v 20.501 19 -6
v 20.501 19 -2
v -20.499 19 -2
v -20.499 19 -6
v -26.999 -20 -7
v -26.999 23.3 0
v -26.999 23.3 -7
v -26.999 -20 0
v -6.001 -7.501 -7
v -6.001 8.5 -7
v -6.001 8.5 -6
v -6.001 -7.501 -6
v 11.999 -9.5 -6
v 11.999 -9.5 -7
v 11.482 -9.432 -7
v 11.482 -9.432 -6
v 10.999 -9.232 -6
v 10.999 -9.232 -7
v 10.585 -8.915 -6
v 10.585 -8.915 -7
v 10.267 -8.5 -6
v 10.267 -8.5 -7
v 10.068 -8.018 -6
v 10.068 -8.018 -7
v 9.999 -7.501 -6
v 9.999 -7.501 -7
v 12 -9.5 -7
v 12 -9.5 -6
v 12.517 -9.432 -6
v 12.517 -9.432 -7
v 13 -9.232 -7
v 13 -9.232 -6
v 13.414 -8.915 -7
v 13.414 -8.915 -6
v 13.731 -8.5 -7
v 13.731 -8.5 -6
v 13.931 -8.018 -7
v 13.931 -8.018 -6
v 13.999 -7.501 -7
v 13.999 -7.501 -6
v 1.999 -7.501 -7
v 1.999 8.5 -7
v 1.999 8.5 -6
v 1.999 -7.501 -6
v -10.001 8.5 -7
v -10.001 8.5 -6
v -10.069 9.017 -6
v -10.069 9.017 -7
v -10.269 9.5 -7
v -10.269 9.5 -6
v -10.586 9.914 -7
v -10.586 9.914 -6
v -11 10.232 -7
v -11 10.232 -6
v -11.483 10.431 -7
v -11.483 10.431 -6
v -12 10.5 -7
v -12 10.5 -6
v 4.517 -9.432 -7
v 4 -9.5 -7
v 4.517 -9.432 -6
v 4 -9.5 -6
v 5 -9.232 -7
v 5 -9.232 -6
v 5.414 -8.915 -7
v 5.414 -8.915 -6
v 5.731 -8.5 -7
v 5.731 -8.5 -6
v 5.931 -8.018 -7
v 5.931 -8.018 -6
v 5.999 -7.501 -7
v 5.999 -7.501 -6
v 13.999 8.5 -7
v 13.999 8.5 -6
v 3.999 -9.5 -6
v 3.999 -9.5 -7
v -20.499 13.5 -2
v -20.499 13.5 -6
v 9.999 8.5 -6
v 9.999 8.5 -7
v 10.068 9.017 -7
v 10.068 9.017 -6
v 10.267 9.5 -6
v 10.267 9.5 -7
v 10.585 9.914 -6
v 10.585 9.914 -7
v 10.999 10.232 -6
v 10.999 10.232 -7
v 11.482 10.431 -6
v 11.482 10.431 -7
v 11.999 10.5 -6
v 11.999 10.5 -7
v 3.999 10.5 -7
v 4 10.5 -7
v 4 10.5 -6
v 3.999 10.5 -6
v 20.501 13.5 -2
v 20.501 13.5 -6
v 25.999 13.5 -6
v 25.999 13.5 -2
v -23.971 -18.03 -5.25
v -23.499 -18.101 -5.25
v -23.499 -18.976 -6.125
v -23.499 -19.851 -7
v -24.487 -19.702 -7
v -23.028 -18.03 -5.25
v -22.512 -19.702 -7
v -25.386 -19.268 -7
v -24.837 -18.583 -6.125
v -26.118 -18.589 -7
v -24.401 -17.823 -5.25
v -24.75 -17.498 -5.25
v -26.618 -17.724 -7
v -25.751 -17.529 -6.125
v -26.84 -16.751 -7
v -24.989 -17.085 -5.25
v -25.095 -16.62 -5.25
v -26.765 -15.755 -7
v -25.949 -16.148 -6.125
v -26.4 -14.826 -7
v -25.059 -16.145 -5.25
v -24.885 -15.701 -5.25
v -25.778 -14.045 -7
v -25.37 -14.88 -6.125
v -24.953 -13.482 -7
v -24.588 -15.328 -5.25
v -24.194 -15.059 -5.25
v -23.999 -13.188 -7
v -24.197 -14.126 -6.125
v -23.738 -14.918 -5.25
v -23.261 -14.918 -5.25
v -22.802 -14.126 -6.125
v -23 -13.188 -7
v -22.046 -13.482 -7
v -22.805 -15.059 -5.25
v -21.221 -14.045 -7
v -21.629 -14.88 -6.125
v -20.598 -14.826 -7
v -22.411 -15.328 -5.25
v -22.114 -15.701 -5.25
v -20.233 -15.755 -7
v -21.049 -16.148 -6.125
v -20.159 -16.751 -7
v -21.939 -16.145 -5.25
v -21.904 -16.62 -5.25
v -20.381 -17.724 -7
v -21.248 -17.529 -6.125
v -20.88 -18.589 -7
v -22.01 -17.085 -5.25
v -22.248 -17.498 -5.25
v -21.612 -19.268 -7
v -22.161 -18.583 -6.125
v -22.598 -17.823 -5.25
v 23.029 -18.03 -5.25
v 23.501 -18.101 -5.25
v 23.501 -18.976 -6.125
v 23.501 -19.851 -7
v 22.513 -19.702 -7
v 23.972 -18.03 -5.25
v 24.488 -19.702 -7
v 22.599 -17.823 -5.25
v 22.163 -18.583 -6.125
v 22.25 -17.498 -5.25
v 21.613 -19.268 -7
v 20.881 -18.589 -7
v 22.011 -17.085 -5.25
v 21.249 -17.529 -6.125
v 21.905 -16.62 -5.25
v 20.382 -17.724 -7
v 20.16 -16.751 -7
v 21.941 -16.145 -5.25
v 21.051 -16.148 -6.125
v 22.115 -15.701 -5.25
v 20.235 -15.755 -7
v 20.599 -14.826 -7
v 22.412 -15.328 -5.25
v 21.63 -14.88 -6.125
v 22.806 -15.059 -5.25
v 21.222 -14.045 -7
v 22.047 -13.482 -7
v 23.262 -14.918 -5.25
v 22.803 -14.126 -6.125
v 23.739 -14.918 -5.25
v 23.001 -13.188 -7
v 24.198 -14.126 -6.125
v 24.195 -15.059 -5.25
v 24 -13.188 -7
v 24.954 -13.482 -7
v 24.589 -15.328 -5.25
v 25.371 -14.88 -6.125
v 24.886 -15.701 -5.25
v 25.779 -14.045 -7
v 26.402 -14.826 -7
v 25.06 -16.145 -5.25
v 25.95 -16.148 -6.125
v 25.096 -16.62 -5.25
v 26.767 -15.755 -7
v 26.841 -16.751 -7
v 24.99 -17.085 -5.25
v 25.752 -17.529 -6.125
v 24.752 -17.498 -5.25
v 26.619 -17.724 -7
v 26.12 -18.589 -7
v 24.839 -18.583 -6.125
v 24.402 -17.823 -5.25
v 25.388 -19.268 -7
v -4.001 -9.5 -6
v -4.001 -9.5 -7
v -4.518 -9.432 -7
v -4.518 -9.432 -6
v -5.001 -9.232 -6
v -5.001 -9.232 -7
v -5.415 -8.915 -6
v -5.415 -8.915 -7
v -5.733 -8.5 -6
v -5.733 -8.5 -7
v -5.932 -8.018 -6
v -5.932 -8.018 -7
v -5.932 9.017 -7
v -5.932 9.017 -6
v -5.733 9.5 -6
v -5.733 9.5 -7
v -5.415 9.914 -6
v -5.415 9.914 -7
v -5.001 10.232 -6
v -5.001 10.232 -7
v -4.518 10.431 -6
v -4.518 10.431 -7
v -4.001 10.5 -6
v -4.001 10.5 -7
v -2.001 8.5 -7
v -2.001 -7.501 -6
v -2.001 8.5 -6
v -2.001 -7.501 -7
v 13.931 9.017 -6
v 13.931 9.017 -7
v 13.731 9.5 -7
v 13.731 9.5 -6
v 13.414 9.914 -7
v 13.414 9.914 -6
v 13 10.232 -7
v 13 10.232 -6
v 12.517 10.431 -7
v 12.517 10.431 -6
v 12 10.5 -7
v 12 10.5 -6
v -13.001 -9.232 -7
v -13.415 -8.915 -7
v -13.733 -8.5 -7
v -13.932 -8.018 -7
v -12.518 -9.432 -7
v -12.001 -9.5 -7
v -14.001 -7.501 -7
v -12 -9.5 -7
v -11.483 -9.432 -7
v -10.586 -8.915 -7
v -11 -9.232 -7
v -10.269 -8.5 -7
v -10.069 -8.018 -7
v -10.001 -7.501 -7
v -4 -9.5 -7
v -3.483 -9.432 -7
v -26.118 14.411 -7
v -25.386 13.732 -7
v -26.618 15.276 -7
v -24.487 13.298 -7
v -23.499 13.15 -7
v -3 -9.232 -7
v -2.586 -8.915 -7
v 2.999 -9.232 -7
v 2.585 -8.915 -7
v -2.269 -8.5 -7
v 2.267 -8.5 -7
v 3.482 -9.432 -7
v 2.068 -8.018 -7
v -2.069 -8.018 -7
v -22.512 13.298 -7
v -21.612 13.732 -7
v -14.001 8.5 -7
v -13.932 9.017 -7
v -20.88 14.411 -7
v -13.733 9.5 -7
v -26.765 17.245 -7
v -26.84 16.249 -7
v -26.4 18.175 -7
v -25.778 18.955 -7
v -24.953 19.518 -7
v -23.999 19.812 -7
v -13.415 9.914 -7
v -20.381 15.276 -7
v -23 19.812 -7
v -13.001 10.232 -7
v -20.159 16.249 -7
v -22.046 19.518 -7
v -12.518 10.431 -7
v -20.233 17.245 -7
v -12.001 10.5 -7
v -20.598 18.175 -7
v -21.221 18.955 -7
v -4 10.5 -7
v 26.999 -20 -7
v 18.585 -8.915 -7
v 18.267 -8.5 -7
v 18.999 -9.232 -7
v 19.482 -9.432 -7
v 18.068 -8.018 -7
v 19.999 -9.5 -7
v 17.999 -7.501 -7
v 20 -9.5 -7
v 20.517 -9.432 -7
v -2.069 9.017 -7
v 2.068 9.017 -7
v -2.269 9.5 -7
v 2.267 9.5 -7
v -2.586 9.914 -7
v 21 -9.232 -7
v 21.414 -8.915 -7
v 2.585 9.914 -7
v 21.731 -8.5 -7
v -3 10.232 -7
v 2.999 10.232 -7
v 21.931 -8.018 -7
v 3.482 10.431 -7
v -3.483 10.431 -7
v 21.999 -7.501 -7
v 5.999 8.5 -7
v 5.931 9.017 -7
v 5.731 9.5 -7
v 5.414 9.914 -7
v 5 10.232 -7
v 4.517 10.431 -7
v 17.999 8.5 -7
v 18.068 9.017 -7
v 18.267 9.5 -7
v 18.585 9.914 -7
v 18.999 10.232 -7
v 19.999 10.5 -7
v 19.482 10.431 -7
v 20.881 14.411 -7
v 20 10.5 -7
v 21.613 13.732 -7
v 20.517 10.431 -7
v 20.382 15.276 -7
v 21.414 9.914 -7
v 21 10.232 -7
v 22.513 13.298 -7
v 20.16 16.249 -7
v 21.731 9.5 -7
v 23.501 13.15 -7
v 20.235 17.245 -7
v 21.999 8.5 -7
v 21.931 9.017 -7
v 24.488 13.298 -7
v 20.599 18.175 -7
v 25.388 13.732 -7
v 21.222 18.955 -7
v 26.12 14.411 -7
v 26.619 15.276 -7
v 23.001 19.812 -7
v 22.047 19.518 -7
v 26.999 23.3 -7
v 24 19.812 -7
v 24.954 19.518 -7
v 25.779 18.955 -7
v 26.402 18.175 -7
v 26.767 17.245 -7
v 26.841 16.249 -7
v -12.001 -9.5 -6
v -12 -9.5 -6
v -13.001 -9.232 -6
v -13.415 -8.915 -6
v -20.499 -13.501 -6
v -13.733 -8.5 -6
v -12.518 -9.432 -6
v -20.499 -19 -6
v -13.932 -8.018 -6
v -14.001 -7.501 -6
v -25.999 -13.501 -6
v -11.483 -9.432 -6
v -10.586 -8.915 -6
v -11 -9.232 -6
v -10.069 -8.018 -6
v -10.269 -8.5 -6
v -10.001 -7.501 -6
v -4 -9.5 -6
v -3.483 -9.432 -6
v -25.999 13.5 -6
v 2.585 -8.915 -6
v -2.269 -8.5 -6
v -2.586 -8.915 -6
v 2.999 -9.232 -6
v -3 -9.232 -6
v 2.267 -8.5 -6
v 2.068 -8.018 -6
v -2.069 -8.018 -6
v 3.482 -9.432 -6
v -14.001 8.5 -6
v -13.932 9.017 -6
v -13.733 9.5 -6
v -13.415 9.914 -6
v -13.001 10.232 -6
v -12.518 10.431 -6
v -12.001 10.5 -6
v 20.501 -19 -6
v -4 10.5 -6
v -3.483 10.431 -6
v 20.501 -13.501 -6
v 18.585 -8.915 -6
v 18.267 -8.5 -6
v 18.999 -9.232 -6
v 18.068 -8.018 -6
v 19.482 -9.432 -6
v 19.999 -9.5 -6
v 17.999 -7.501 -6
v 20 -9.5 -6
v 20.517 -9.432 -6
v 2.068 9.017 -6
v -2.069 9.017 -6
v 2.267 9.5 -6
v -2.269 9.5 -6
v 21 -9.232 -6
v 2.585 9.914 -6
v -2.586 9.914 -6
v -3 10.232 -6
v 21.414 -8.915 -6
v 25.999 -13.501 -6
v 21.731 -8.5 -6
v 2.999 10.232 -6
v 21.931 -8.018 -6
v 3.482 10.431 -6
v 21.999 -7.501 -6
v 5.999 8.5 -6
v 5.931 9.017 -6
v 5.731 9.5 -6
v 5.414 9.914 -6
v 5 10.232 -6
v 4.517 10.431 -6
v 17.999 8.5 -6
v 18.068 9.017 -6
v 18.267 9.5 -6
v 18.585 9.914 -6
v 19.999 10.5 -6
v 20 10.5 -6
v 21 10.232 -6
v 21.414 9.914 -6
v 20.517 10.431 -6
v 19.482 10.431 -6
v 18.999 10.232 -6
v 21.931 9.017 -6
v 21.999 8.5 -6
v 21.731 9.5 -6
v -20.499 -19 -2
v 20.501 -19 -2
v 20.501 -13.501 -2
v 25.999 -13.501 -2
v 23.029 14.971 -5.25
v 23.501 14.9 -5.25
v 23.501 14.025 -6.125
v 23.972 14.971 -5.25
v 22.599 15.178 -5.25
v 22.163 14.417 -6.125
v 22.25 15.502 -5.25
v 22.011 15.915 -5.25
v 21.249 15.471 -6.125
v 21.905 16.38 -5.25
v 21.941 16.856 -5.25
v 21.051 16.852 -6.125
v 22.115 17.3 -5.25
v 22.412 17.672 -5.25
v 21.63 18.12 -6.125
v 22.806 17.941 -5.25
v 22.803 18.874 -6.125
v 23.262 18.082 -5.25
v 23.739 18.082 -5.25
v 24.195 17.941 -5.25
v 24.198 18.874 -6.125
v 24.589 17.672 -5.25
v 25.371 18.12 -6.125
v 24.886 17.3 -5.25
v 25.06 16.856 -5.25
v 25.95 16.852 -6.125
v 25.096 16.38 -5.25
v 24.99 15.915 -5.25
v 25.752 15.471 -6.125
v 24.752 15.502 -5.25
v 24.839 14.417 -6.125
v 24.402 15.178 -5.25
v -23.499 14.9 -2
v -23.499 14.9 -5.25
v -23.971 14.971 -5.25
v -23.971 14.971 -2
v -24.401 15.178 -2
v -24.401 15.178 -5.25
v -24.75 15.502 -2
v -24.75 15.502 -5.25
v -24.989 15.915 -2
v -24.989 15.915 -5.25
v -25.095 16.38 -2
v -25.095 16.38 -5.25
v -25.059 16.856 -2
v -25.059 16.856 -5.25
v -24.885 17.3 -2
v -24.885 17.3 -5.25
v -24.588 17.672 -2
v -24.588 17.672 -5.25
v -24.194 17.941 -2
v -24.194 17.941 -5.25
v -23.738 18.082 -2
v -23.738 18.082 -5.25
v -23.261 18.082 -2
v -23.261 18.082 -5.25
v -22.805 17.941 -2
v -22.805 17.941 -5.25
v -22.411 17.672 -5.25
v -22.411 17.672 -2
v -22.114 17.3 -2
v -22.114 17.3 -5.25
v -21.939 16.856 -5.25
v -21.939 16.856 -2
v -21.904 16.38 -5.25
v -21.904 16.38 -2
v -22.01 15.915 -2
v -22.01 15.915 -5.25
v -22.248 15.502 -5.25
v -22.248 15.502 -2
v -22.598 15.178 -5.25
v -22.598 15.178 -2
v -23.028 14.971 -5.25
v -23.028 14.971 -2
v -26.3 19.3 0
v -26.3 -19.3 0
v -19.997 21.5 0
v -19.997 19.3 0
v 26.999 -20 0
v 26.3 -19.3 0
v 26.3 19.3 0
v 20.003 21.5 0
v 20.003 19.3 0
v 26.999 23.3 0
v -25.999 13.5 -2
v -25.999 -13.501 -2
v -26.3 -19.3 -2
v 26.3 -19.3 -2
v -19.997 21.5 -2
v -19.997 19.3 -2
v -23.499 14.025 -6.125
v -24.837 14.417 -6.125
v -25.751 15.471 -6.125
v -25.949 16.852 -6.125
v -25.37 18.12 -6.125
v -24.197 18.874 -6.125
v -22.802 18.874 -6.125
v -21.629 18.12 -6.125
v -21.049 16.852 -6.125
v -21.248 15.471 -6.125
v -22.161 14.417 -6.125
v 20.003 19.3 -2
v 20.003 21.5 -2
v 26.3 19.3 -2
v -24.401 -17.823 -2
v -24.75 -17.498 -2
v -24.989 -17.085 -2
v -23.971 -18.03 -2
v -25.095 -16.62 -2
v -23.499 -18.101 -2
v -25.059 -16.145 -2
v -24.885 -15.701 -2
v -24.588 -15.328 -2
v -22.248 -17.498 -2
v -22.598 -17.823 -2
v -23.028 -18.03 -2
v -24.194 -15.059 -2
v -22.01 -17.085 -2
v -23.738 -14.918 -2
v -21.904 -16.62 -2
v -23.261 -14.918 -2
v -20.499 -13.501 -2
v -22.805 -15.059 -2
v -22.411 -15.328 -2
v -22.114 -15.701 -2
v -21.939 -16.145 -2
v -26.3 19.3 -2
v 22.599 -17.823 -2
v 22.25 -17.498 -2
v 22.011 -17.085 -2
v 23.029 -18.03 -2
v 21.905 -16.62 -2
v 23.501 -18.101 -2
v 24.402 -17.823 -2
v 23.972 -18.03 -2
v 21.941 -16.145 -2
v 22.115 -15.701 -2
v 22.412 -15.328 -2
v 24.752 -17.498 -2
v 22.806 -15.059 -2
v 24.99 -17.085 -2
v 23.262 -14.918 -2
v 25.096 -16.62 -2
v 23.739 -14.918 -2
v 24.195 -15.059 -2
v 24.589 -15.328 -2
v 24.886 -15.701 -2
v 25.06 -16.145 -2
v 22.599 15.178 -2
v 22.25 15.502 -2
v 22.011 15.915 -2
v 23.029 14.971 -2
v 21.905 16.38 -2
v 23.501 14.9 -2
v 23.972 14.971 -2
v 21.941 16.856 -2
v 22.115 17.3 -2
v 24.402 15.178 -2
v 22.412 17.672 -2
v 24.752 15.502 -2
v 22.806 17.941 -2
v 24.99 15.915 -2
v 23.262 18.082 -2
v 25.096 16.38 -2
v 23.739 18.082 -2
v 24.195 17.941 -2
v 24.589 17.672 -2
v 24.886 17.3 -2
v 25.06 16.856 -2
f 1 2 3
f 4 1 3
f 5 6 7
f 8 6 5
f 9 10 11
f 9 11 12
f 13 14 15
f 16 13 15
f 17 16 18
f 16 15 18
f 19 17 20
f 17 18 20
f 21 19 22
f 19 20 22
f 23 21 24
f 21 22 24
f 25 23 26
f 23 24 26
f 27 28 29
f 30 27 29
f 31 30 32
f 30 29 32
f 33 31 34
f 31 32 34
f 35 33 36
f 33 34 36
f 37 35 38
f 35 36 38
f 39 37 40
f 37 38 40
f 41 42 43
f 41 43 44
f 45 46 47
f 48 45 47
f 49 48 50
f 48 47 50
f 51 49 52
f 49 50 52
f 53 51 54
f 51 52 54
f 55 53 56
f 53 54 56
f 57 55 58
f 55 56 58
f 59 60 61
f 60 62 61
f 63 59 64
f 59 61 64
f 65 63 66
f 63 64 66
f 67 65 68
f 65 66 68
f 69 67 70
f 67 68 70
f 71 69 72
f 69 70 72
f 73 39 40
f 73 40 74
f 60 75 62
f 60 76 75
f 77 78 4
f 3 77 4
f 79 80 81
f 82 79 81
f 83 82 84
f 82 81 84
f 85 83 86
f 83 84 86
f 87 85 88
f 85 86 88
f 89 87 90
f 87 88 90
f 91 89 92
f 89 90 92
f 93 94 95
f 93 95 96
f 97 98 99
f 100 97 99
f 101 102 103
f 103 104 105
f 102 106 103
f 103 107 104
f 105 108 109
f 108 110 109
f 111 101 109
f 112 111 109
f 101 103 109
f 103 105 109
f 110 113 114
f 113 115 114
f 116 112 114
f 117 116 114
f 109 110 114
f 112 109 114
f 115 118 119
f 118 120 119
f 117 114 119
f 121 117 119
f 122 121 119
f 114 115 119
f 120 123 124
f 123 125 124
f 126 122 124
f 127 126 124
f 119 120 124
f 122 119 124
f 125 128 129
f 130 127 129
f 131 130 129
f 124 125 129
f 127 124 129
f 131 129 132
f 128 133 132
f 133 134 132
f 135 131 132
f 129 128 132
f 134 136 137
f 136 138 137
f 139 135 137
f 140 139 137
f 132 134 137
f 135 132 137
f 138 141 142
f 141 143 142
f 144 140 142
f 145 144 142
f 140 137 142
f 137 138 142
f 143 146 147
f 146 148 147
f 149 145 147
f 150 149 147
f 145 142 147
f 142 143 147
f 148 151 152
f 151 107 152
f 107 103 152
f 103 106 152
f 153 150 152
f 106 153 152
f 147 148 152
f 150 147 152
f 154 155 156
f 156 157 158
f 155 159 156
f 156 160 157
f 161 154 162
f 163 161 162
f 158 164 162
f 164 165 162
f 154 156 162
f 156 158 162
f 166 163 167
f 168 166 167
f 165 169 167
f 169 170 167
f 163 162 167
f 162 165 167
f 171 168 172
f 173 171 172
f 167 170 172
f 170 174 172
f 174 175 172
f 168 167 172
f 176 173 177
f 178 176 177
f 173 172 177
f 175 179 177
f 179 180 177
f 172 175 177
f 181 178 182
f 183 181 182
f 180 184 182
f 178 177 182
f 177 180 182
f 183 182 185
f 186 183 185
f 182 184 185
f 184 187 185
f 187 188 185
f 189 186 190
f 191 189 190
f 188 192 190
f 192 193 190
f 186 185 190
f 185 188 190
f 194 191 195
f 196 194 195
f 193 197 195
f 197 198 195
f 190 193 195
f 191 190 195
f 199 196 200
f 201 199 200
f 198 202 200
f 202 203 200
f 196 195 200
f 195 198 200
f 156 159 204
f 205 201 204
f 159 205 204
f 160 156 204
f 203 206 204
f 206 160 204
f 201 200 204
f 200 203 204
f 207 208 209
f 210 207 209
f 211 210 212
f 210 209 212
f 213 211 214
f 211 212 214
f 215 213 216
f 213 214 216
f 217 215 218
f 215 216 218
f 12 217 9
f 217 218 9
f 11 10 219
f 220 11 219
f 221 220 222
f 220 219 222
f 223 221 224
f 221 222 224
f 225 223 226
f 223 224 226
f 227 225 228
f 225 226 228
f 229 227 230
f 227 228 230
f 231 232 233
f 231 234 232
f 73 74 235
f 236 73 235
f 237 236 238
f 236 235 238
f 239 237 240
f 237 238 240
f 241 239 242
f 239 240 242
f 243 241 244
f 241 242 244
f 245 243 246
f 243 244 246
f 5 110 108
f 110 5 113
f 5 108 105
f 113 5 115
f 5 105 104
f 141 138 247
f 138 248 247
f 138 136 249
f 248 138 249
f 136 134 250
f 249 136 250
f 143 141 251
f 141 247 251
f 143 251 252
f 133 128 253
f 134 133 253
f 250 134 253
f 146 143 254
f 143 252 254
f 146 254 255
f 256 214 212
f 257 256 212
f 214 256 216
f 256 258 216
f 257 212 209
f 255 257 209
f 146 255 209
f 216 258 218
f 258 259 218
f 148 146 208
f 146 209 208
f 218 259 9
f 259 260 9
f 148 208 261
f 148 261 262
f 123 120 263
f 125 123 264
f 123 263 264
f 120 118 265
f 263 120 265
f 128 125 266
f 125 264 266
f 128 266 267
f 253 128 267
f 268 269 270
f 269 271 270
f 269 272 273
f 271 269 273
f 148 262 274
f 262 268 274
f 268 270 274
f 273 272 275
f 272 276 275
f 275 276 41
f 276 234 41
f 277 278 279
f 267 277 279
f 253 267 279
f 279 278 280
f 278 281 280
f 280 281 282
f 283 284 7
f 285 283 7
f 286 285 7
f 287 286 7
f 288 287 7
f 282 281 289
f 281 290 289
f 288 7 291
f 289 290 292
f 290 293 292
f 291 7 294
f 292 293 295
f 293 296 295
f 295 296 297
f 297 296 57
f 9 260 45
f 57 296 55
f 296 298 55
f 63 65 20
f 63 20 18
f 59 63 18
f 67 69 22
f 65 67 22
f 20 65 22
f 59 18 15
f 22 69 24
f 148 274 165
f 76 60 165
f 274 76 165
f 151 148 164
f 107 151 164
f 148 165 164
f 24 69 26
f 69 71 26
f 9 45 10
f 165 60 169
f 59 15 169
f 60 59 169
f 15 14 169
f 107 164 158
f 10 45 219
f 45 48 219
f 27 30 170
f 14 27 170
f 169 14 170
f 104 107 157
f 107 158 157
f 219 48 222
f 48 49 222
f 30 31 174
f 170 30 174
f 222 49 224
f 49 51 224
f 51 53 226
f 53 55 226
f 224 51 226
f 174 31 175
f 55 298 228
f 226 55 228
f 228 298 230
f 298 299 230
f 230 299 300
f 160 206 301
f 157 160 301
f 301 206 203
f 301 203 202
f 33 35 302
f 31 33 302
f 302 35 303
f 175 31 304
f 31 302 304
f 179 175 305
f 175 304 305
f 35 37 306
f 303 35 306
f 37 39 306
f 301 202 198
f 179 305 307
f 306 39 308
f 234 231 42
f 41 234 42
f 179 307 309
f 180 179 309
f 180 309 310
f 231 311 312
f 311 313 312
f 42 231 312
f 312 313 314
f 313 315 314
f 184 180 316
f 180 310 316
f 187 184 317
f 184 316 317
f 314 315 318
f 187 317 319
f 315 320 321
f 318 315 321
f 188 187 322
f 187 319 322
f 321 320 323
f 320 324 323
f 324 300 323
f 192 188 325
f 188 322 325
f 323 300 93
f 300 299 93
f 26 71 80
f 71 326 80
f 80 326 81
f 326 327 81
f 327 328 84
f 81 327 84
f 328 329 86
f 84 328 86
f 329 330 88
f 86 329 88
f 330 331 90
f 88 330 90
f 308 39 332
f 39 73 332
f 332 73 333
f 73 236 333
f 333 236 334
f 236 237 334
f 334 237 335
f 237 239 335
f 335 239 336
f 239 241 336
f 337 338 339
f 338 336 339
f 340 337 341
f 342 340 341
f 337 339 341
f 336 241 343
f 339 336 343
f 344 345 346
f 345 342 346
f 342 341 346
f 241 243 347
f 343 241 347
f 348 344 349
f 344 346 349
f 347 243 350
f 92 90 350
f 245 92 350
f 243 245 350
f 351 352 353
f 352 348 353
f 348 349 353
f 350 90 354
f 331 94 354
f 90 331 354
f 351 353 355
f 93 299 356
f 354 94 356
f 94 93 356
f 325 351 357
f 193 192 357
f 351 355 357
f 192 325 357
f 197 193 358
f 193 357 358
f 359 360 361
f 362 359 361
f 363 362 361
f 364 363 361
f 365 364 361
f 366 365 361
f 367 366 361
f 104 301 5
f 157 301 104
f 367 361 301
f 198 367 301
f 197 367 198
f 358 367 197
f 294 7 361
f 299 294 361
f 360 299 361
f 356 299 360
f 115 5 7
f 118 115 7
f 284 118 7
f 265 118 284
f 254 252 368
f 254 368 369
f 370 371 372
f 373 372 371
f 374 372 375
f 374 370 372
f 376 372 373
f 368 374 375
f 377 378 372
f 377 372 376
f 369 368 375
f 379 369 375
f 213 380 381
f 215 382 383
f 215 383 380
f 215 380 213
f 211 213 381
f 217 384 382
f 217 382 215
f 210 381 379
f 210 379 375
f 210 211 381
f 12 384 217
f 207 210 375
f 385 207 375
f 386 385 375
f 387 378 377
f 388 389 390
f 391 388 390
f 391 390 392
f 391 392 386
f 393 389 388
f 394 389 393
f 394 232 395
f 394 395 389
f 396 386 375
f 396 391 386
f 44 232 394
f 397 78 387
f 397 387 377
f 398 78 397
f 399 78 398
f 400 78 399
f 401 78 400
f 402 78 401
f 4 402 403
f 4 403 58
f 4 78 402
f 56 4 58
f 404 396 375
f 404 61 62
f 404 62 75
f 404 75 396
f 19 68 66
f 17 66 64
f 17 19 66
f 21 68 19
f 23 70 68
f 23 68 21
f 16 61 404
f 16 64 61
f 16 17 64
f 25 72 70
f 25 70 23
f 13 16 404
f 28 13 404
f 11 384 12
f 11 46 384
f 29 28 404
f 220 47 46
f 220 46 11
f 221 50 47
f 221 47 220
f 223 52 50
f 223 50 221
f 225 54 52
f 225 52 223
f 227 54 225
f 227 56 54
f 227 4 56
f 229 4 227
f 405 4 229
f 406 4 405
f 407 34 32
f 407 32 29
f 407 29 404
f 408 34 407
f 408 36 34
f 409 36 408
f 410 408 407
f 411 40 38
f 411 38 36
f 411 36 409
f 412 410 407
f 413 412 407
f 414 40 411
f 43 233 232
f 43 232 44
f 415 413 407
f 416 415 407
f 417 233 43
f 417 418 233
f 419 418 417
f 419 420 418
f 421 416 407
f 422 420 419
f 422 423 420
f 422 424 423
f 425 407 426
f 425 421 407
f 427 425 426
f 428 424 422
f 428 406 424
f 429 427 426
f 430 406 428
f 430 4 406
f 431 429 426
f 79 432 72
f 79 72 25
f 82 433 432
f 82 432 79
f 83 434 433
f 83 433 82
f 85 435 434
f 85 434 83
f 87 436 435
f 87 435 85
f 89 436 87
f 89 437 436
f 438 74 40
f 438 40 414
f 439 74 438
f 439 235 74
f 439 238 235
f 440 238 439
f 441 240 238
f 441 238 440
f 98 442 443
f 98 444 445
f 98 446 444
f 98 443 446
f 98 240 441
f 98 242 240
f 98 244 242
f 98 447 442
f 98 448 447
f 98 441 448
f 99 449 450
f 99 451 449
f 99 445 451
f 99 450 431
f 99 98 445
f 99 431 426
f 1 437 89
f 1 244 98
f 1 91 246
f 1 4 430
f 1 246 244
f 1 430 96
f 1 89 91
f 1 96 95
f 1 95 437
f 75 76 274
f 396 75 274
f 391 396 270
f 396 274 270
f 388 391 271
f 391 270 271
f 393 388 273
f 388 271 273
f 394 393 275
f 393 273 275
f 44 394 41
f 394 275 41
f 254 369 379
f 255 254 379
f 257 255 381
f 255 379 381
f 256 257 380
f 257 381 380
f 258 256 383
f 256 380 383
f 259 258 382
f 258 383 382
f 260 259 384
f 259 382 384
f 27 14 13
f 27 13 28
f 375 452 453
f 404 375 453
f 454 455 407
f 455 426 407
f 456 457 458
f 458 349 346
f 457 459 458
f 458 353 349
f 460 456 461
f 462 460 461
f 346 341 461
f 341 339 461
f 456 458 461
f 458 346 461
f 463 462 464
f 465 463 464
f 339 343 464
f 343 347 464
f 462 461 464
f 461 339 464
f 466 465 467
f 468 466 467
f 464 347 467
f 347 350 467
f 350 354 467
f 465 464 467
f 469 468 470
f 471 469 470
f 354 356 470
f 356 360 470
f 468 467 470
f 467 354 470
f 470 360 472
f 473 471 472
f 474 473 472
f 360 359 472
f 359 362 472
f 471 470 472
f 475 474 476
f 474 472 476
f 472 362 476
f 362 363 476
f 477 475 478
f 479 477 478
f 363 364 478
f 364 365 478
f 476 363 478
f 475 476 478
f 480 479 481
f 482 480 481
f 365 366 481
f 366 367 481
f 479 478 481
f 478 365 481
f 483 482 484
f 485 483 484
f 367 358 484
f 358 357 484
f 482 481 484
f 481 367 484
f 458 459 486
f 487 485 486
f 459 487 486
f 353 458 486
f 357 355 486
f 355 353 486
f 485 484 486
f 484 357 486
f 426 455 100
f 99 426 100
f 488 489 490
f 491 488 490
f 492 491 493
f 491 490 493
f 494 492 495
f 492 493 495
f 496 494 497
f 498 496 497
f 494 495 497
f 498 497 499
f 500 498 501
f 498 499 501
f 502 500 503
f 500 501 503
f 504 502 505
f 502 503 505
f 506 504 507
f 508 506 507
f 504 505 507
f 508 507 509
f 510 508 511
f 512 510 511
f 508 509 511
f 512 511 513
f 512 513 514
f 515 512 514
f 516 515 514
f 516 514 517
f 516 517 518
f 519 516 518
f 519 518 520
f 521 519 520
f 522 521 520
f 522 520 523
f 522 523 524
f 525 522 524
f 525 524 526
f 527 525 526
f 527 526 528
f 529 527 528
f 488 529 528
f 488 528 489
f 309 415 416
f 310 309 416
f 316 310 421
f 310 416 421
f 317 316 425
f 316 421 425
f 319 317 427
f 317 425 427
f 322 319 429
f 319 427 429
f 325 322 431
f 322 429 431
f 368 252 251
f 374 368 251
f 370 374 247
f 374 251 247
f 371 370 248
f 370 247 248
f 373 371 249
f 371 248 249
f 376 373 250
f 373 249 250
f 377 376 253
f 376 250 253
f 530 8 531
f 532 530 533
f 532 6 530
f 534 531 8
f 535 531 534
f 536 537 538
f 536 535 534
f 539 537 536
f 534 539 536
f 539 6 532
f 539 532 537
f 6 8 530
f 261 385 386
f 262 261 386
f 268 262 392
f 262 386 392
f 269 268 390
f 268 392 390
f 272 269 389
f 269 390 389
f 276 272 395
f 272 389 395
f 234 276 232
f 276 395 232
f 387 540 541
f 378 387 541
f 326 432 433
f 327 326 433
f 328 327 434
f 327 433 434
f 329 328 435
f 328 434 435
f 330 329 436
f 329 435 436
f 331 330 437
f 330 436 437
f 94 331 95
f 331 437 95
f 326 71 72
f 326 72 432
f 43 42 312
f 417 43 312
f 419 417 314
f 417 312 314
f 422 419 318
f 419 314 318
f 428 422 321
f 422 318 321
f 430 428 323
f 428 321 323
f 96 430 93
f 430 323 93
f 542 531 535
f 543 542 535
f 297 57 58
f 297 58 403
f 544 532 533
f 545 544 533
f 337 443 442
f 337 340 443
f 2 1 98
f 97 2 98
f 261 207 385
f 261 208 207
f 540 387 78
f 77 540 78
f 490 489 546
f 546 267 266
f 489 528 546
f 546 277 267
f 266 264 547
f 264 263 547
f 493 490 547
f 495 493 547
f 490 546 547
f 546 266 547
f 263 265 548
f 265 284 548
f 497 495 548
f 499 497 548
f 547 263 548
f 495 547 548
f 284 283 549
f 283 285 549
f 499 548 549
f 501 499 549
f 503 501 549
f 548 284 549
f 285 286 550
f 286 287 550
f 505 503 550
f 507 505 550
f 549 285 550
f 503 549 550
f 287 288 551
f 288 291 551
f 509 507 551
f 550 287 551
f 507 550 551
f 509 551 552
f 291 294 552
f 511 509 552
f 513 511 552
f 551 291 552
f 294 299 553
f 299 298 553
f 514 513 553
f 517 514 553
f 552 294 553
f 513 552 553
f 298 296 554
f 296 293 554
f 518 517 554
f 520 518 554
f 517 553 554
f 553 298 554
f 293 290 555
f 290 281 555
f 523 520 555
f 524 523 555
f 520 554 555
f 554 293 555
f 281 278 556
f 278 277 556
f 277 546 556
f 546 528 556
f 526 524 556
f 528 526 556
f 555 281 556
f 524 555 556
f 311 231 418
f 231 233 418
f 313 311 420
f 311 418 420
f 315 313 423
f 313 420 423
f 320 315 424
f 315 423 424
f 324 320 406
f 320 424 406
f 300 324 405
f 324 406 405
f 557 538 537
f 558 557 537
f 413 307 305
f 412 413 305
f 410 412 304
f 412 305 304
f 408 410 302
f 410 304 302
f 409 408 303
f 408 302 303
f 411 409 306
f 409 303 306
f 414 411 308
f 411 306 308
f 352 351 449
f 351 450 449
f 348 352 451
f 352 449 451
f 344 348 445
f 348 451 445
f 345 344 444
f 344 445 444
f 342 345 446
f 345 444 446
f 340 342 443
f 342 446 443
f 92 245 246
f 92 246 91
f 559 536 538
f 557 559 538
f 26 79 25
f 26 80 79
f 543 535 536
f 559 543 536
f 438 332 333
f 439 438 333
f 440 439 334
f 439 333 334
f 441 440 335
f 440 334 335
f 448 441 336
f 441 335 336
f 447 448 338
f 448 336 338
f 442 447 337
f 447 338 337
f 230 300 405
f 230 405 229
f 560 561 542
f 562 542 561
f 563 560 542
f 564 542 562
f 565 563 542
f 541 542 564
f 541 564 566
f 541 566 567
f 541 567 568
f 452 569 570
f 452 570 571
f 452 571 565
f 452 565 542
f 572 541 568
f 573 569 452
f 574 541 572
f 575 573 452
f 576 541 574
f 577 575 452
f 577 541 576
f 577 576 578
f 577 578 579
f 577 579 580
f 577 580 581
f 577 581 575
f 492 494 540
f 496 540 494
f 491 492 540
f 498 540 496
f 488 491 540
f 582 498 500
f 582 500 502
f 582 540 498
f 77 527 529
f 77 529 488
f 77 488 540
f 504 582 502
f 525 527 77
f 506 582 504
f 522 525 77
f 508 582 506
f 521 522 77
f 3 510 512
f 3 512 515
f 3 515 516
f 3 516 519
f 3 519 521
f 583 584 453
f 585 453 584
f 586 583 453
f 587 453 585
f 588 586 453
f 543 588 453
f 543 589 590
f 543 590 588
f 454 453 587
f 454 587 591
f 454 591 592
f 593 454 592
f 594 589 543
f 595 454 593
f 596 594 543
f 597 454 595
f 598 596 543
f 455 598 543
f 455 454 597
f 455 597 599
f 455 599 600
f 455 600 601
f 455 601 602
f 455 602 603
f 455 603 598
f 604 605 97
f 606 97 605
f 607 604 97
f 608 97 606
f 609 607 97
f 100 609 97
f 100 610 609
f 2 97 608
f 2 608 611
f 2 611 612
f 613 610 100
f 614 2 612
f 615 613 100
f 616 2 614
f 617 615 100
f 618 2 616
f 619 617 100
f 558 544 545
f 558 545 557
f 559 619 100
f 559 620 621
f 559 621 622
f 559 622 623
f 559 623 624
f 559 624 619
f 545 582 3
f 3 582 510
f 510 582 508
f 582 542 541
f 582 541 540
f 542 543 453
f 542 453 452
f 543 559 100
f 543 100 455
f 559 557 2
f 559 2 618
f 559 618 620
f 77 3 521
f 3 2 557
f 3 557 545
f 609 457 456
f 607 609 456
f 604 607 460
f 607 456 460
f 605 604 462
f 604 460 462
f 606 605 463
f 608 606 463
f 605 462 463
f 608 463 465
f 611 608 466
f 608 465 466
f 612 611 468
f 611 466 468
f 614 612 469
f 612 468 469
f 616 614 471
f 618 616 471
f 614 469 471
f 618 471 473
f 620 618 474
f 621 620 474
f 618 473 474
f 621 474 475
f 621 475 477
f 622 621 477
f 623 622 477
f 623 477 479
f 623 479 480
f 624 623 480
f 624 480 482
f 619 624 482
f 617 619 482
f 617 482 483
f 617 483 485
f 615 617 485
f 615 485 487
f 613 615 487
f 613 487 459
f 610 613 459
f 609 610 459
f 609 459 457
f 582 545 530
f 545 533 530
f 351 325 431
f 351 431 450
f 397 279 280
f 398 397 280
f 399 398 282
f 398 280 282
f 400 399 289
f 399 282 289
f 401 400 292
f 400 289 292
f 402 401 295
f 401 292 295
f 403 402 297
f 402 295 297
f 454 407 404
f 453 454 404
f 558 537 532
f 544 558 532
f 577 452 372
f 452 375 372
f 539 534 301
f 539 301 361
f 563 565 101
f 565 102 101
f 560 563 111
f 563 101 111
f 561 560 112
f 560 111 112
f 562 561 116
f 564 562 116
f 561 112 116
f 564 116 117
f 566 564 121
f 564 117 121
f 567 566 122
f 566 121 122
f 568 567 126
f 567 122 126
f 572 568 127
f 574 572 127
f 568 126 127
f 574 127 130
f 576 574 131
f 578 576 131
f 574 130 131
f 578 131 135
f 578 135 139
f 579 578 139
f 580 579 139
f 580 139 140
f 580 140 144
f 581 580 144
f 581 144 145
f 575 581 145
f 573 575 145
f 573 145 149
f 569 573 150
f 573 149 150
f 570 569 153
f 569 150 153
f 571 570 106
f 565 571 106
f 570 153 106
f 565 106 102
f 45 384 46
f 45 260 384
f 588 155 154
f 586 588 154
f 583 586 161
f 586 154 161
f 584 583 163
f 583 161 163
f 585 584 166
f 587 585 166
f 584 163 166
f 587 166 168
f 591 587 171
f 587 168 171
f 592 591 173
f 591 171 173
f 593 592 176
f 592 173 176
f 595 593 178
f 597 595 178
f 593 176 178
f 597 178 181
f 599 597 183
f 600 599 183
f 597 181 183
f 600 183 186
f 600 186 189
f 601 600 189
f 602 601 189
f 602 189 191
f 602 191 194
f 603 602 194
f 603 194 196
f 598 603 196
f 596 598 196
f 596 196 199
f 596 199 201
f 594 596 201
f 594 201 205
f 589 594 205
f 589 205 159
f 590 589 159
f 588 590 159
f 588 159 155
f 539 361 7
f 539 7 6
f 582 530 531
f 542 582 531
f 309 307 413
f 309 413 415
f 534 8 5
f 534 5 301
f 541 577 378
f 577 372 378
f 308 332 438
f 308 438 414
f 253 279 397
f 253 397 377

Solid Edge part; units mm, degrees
sketch "Sketch1" plane through (0, 0, 0) normal (0, 0, 1) x (1, 0, 0)
  line L0 (-26.9994, -20.0005) -> (26.9994, -20.0005)
  line L1 (26.9994, -20.0005) -> (26.9994, 23.0005)
  line L2 (26.9994, 23.0005) -> (-26.9994, 23.0005)
  line L3 (-26.9994, 23.0005) -> (-26.9994, -20.0005)
  dimension "D1" = 4
  dimension "D2" = 1
  dimension "D3" = 1
  dimension "D4" = 1
extrude "Protrusion1" add sketch "Sketch1" against normal blind 7
sketch "Sketch2" plane through (0, 1.5, 0) normal (0, 0, 1) x (1, 0, 0)
  line L0 (-25.9994, -20.5005) -> (25.9994, -20.5005)
  line L1 (25.9994, -20.5005) -> (25.9994, 17.5005)
  line L2 (25.9994, 17.5005) -> (-25.9994, 17.5005)
  line L3 (-25.9994, 17.5005) -> (-25.9994, -20.5005)
extrude "Extrusionsausschnitt_1" cut sketch "Sketch2" against normal blind 6
sketch "Sketch3" plane through (0, 0, -6) normal (0, 0, 1) x (1, 0, 0)
  line L0 (-26.4993, 13.4996) -> (-20.4993, 13.4996)
  line L1 (-20.4993, 13.4996) -> (-20.4993, 19.4996)
  line L2 (-20.4993, 19.4996) -> (-26.4993, 19.4996)
  line L3 (-26.4993, 19.4996) -> (-26.4993, 13.4996)
extrude "Extrusionsausprägung_2" add sketch "Sketch3" along normal blind 4.4
sketch "Sketch4" plane through (0, 0, -6) normal (0, 0, 1) x (1, 0, 0)
  line L0 (-26.4993, -19.5006) -> (-20.4993, -19.5006)
  line L1 (-20.4993, -19.5006) -> (-20.4993, -13.5006)
  line L2 (-20.4993, -13.5006) -> (-26.4993, -13.5006)
  line L3 (-26.4993, -13.5006) -> (-26.4993, -19.5006)
extrude "Protrusion2" add sketch "Sketch4" along normal blind 4.4
sketch "Sketch5" plane through (0, 0, -6) normal (0, 0, 1) x (1, 0, 0)
  line L0 (20.5006, -19.5006) -> (26.5006, -19.5006)
  line L1 (26.5006, -19.5006) -> (26.5006, -13.5006)
  line L2 (26.5006, -13.5006) -> (20.5006, -13.5006)
  line L3 (20.5006, -13.5006) -> (20.5006, -19.5006)
  line L4 (20.5006, 13.4996) -> (26.5006, 13.4996)
  line L5 (26.5006, 13.4996) -> (26.5006, 19.4996)
  line L6 (26.5006, 19.4996) -> (20.5006, 19.4996)
  line L7 (20.5006, 19.4996) -> (20.5006, 13.4996)
extrude "Extrusionsausprägung_4" add sketch "Sketch5" along normal blind 4.4
sketch "Sketch6" plane through (0, 1.5, -7) normal (0, 0, -1) x (0, -1, 0)
  circle A0 centre (-14.9996, 23.4993) radius 1.6
  circle A1 centre (18.0006, 23.4993) radius 1.6
  circle A2 centre (18.0006, -23.5006) radius 1.6
  circle A3 centre (-14.9996, -23.5006) radius 1.6
extrude "Extrusionsausschnitt_3" cut sketch "Sketch6" against normal blind 225.4763
sketch "Sketch7" plane through (0, 1.5, 0) normal (0, 0, 1) x (1, 0, 0)
  line L0 (-19.997, 17.5005) -> (20.003, 17.5005)
  line L1 (20.003, 17.5005) -> (20.003, 20.0005)
  line L2 (20.003, 20.0005) -> (-19.997, 20.0005)
  line L3 (-19.997, 20.0005) -> (-19.997, 17.5005)
  dimension "D1" = 20.003
  dimension "D2" = 20.003
extrude "Extrusionsausschnitt_4" cut sketch "Sketch7" against normal blind 2
sketch "Sketch8" plane through (0, 0, -6) normal (0, 0, 1) x (1, 0, 0)
  line L0 (17.9994, -9.5004) -> (21.9994, -9.5004)
  line L1 (21.9994, -9.5004) -> (21.9994, 10.4996)
  line L2 (21.9994, 10.4996) -> (17.9994, 10.4996)
  line L3 (17.9994, 10.4996) -> (17.9994, -9.5004)
  line L4 (9.9994, -9.5004) -> (13.9994, -9.5004)
  line L5 (13.9994, -9.5004) -> (13.9994, 10.4996)
  line L6 (13.9994, 10.4996) -> (9.9994, 10.4996)
  line L7 (9.9994, 10.4996) -> (9.9994, -9.5004)
  line L8 (1.9994, -9.5004) -> (5.9994, -9.5004)
  line L9 (5.9994, -9.5004) -> (5.9994, 10.4996)
  line L10 (5.9994, 10.4996) -> (1.9994, 10.4996)
  line L11 (1.9994, 10.4996) -> (1.9994, -9.5004)
  line L12 (-6.0006, -9.5004) -> (-2.0006, -9.5004)
  line L13 (-2.0006, -9.5004) -> (-2.0006, 10.4996)
  line L14 (-2.0006, 10.4996) -> (-6.0006, 10.4996)
  line L15 (-6.0006, 10.4996) -> (-6.0006, -9.5004)
  line L16 (-14.0006, -9.5004) -> (-10.0006, -9.5004)
  line L17 (-10.0006, -9.5004) -> (-10.0006, 10.4996)
  line L18 (-10.0006, 10.4996) -> (-14.0006, 10.4996)
  line L19 (-14.0006, 10.4996) -> (-14.0006, -9.5004)
  dimension "D1" = 4
  dimension "D2" = 20
  dimension "D3" = 4
  dimension "D4" = 20
  dimension "D5" = 4
  dimension "D6" = 20
  dimension "D7" = 4
  dimension "D8" = 20
  dimension "D9" = 4
  dimension "D10" = 20
  dimension "D11" = 4
  dimension "D12" = 4
  dimension "D13" = 4
  dimension "D14" = 4
  dimension "D15" = 4
  dimension "D16" = 3
  dimension "D17" = 3
  dimension "D18" = 3
  dimension "D19" = 3
  dimension "D20" = 3
extrude "Cutout1" cut sketch "Sketch8" along normal mid plane 25.2613
fillet "Verrundung_1" radius 2 20 edges at (-10.0006, 10.4996, -6.5) (-2.0006, 10.4996, -6.5) (5.9994, 10.4996, -6.5) (13.9994, 10.4996, -6.5) (21.9994, 10.4996, -6.5) (17.9994, 10.4996, -6.5) (9.9994, 10.4996, -6.5) (1.9994, 10.4996, -6.5) (-6.0006, 10.4996, -6.5) (-14.0006, 10.4996, -6.5) (-14.0006, -9.5004, -6.5) (-6.0006, -9.5004, -6.5) (1.9994, -9.5004, -6.5) (9.9994, -9.5004, -6.5) (17.9994, -9.5004, -6.5) (-10.0006, -9.5004, -6.5) (-2.0006, -9.5004, -6.5) (5.9994, -9.5004, -6.5) (13.9994, -9.5004, -6.5) (21.9994, -9.5004, -6.5)
sketch "Sketch9" plane through (0, 1.5, 0) normal (0, 0, 1) x (0, 1, 0)
  line L0 (21.3005, -40) -> (21.3005, 40)
  dimension "D1" = 0.2
  dimension "D2" = 80
extrude "Extrusionsausschnitt_6" cut sketch "Sketch9" along normal mid plane 56.5078 material side at (0, 22.8505, 0)
sketch "Sketch10" plane through (0, 1.4, 0) normal (0, 0, 1) x (1, 0, 0)
  line L0 (-26.3, -20.7) -> (26.3, -20.7)
  line L1 (26.3, -20.7) -> (26.3, 17.9)
  line L2 (26.3, 17.9) -> (-26.3, 17.9)
  line L3 (-26.3, 17.9) -> (-26.3, -20.7)
  dimension "D1" = 52.6
  dimension "D2" = 38.6
extrude "Extrusionsausschnitt_7" cut sketch "Sketch10" against normal blind 2
sketch "Sketch11" plane through (0, 22.8005, -3.5) normal (0, 1, 0) x (1, 0, 0)
  line L0 (-26.9994, -3.5) -> (26.9994, -3.5)
  line L1 (26.9994, -3.5) -> (26.9994, 3.5)
  line L2 (26.9994, 3.5) -> (-26.9994, 3.5)
  line L3 (-26.9994, 3.5) -> (-26.9994, -3.5)
extrude "Protrusion3" add sketch "Sketch11" along normal blind 0.5
chamfer "Chamfer1" distance 1.75 angle 45 1 edges at (23.5006, 18.0996, -7)
chamfer "Fase_3" distance 1.75 angle 45 3 edges at (23.5006, -14.9006, -7) (-23.4993, -14.9006, -7) (-23.4993, 18.0996, -7)
